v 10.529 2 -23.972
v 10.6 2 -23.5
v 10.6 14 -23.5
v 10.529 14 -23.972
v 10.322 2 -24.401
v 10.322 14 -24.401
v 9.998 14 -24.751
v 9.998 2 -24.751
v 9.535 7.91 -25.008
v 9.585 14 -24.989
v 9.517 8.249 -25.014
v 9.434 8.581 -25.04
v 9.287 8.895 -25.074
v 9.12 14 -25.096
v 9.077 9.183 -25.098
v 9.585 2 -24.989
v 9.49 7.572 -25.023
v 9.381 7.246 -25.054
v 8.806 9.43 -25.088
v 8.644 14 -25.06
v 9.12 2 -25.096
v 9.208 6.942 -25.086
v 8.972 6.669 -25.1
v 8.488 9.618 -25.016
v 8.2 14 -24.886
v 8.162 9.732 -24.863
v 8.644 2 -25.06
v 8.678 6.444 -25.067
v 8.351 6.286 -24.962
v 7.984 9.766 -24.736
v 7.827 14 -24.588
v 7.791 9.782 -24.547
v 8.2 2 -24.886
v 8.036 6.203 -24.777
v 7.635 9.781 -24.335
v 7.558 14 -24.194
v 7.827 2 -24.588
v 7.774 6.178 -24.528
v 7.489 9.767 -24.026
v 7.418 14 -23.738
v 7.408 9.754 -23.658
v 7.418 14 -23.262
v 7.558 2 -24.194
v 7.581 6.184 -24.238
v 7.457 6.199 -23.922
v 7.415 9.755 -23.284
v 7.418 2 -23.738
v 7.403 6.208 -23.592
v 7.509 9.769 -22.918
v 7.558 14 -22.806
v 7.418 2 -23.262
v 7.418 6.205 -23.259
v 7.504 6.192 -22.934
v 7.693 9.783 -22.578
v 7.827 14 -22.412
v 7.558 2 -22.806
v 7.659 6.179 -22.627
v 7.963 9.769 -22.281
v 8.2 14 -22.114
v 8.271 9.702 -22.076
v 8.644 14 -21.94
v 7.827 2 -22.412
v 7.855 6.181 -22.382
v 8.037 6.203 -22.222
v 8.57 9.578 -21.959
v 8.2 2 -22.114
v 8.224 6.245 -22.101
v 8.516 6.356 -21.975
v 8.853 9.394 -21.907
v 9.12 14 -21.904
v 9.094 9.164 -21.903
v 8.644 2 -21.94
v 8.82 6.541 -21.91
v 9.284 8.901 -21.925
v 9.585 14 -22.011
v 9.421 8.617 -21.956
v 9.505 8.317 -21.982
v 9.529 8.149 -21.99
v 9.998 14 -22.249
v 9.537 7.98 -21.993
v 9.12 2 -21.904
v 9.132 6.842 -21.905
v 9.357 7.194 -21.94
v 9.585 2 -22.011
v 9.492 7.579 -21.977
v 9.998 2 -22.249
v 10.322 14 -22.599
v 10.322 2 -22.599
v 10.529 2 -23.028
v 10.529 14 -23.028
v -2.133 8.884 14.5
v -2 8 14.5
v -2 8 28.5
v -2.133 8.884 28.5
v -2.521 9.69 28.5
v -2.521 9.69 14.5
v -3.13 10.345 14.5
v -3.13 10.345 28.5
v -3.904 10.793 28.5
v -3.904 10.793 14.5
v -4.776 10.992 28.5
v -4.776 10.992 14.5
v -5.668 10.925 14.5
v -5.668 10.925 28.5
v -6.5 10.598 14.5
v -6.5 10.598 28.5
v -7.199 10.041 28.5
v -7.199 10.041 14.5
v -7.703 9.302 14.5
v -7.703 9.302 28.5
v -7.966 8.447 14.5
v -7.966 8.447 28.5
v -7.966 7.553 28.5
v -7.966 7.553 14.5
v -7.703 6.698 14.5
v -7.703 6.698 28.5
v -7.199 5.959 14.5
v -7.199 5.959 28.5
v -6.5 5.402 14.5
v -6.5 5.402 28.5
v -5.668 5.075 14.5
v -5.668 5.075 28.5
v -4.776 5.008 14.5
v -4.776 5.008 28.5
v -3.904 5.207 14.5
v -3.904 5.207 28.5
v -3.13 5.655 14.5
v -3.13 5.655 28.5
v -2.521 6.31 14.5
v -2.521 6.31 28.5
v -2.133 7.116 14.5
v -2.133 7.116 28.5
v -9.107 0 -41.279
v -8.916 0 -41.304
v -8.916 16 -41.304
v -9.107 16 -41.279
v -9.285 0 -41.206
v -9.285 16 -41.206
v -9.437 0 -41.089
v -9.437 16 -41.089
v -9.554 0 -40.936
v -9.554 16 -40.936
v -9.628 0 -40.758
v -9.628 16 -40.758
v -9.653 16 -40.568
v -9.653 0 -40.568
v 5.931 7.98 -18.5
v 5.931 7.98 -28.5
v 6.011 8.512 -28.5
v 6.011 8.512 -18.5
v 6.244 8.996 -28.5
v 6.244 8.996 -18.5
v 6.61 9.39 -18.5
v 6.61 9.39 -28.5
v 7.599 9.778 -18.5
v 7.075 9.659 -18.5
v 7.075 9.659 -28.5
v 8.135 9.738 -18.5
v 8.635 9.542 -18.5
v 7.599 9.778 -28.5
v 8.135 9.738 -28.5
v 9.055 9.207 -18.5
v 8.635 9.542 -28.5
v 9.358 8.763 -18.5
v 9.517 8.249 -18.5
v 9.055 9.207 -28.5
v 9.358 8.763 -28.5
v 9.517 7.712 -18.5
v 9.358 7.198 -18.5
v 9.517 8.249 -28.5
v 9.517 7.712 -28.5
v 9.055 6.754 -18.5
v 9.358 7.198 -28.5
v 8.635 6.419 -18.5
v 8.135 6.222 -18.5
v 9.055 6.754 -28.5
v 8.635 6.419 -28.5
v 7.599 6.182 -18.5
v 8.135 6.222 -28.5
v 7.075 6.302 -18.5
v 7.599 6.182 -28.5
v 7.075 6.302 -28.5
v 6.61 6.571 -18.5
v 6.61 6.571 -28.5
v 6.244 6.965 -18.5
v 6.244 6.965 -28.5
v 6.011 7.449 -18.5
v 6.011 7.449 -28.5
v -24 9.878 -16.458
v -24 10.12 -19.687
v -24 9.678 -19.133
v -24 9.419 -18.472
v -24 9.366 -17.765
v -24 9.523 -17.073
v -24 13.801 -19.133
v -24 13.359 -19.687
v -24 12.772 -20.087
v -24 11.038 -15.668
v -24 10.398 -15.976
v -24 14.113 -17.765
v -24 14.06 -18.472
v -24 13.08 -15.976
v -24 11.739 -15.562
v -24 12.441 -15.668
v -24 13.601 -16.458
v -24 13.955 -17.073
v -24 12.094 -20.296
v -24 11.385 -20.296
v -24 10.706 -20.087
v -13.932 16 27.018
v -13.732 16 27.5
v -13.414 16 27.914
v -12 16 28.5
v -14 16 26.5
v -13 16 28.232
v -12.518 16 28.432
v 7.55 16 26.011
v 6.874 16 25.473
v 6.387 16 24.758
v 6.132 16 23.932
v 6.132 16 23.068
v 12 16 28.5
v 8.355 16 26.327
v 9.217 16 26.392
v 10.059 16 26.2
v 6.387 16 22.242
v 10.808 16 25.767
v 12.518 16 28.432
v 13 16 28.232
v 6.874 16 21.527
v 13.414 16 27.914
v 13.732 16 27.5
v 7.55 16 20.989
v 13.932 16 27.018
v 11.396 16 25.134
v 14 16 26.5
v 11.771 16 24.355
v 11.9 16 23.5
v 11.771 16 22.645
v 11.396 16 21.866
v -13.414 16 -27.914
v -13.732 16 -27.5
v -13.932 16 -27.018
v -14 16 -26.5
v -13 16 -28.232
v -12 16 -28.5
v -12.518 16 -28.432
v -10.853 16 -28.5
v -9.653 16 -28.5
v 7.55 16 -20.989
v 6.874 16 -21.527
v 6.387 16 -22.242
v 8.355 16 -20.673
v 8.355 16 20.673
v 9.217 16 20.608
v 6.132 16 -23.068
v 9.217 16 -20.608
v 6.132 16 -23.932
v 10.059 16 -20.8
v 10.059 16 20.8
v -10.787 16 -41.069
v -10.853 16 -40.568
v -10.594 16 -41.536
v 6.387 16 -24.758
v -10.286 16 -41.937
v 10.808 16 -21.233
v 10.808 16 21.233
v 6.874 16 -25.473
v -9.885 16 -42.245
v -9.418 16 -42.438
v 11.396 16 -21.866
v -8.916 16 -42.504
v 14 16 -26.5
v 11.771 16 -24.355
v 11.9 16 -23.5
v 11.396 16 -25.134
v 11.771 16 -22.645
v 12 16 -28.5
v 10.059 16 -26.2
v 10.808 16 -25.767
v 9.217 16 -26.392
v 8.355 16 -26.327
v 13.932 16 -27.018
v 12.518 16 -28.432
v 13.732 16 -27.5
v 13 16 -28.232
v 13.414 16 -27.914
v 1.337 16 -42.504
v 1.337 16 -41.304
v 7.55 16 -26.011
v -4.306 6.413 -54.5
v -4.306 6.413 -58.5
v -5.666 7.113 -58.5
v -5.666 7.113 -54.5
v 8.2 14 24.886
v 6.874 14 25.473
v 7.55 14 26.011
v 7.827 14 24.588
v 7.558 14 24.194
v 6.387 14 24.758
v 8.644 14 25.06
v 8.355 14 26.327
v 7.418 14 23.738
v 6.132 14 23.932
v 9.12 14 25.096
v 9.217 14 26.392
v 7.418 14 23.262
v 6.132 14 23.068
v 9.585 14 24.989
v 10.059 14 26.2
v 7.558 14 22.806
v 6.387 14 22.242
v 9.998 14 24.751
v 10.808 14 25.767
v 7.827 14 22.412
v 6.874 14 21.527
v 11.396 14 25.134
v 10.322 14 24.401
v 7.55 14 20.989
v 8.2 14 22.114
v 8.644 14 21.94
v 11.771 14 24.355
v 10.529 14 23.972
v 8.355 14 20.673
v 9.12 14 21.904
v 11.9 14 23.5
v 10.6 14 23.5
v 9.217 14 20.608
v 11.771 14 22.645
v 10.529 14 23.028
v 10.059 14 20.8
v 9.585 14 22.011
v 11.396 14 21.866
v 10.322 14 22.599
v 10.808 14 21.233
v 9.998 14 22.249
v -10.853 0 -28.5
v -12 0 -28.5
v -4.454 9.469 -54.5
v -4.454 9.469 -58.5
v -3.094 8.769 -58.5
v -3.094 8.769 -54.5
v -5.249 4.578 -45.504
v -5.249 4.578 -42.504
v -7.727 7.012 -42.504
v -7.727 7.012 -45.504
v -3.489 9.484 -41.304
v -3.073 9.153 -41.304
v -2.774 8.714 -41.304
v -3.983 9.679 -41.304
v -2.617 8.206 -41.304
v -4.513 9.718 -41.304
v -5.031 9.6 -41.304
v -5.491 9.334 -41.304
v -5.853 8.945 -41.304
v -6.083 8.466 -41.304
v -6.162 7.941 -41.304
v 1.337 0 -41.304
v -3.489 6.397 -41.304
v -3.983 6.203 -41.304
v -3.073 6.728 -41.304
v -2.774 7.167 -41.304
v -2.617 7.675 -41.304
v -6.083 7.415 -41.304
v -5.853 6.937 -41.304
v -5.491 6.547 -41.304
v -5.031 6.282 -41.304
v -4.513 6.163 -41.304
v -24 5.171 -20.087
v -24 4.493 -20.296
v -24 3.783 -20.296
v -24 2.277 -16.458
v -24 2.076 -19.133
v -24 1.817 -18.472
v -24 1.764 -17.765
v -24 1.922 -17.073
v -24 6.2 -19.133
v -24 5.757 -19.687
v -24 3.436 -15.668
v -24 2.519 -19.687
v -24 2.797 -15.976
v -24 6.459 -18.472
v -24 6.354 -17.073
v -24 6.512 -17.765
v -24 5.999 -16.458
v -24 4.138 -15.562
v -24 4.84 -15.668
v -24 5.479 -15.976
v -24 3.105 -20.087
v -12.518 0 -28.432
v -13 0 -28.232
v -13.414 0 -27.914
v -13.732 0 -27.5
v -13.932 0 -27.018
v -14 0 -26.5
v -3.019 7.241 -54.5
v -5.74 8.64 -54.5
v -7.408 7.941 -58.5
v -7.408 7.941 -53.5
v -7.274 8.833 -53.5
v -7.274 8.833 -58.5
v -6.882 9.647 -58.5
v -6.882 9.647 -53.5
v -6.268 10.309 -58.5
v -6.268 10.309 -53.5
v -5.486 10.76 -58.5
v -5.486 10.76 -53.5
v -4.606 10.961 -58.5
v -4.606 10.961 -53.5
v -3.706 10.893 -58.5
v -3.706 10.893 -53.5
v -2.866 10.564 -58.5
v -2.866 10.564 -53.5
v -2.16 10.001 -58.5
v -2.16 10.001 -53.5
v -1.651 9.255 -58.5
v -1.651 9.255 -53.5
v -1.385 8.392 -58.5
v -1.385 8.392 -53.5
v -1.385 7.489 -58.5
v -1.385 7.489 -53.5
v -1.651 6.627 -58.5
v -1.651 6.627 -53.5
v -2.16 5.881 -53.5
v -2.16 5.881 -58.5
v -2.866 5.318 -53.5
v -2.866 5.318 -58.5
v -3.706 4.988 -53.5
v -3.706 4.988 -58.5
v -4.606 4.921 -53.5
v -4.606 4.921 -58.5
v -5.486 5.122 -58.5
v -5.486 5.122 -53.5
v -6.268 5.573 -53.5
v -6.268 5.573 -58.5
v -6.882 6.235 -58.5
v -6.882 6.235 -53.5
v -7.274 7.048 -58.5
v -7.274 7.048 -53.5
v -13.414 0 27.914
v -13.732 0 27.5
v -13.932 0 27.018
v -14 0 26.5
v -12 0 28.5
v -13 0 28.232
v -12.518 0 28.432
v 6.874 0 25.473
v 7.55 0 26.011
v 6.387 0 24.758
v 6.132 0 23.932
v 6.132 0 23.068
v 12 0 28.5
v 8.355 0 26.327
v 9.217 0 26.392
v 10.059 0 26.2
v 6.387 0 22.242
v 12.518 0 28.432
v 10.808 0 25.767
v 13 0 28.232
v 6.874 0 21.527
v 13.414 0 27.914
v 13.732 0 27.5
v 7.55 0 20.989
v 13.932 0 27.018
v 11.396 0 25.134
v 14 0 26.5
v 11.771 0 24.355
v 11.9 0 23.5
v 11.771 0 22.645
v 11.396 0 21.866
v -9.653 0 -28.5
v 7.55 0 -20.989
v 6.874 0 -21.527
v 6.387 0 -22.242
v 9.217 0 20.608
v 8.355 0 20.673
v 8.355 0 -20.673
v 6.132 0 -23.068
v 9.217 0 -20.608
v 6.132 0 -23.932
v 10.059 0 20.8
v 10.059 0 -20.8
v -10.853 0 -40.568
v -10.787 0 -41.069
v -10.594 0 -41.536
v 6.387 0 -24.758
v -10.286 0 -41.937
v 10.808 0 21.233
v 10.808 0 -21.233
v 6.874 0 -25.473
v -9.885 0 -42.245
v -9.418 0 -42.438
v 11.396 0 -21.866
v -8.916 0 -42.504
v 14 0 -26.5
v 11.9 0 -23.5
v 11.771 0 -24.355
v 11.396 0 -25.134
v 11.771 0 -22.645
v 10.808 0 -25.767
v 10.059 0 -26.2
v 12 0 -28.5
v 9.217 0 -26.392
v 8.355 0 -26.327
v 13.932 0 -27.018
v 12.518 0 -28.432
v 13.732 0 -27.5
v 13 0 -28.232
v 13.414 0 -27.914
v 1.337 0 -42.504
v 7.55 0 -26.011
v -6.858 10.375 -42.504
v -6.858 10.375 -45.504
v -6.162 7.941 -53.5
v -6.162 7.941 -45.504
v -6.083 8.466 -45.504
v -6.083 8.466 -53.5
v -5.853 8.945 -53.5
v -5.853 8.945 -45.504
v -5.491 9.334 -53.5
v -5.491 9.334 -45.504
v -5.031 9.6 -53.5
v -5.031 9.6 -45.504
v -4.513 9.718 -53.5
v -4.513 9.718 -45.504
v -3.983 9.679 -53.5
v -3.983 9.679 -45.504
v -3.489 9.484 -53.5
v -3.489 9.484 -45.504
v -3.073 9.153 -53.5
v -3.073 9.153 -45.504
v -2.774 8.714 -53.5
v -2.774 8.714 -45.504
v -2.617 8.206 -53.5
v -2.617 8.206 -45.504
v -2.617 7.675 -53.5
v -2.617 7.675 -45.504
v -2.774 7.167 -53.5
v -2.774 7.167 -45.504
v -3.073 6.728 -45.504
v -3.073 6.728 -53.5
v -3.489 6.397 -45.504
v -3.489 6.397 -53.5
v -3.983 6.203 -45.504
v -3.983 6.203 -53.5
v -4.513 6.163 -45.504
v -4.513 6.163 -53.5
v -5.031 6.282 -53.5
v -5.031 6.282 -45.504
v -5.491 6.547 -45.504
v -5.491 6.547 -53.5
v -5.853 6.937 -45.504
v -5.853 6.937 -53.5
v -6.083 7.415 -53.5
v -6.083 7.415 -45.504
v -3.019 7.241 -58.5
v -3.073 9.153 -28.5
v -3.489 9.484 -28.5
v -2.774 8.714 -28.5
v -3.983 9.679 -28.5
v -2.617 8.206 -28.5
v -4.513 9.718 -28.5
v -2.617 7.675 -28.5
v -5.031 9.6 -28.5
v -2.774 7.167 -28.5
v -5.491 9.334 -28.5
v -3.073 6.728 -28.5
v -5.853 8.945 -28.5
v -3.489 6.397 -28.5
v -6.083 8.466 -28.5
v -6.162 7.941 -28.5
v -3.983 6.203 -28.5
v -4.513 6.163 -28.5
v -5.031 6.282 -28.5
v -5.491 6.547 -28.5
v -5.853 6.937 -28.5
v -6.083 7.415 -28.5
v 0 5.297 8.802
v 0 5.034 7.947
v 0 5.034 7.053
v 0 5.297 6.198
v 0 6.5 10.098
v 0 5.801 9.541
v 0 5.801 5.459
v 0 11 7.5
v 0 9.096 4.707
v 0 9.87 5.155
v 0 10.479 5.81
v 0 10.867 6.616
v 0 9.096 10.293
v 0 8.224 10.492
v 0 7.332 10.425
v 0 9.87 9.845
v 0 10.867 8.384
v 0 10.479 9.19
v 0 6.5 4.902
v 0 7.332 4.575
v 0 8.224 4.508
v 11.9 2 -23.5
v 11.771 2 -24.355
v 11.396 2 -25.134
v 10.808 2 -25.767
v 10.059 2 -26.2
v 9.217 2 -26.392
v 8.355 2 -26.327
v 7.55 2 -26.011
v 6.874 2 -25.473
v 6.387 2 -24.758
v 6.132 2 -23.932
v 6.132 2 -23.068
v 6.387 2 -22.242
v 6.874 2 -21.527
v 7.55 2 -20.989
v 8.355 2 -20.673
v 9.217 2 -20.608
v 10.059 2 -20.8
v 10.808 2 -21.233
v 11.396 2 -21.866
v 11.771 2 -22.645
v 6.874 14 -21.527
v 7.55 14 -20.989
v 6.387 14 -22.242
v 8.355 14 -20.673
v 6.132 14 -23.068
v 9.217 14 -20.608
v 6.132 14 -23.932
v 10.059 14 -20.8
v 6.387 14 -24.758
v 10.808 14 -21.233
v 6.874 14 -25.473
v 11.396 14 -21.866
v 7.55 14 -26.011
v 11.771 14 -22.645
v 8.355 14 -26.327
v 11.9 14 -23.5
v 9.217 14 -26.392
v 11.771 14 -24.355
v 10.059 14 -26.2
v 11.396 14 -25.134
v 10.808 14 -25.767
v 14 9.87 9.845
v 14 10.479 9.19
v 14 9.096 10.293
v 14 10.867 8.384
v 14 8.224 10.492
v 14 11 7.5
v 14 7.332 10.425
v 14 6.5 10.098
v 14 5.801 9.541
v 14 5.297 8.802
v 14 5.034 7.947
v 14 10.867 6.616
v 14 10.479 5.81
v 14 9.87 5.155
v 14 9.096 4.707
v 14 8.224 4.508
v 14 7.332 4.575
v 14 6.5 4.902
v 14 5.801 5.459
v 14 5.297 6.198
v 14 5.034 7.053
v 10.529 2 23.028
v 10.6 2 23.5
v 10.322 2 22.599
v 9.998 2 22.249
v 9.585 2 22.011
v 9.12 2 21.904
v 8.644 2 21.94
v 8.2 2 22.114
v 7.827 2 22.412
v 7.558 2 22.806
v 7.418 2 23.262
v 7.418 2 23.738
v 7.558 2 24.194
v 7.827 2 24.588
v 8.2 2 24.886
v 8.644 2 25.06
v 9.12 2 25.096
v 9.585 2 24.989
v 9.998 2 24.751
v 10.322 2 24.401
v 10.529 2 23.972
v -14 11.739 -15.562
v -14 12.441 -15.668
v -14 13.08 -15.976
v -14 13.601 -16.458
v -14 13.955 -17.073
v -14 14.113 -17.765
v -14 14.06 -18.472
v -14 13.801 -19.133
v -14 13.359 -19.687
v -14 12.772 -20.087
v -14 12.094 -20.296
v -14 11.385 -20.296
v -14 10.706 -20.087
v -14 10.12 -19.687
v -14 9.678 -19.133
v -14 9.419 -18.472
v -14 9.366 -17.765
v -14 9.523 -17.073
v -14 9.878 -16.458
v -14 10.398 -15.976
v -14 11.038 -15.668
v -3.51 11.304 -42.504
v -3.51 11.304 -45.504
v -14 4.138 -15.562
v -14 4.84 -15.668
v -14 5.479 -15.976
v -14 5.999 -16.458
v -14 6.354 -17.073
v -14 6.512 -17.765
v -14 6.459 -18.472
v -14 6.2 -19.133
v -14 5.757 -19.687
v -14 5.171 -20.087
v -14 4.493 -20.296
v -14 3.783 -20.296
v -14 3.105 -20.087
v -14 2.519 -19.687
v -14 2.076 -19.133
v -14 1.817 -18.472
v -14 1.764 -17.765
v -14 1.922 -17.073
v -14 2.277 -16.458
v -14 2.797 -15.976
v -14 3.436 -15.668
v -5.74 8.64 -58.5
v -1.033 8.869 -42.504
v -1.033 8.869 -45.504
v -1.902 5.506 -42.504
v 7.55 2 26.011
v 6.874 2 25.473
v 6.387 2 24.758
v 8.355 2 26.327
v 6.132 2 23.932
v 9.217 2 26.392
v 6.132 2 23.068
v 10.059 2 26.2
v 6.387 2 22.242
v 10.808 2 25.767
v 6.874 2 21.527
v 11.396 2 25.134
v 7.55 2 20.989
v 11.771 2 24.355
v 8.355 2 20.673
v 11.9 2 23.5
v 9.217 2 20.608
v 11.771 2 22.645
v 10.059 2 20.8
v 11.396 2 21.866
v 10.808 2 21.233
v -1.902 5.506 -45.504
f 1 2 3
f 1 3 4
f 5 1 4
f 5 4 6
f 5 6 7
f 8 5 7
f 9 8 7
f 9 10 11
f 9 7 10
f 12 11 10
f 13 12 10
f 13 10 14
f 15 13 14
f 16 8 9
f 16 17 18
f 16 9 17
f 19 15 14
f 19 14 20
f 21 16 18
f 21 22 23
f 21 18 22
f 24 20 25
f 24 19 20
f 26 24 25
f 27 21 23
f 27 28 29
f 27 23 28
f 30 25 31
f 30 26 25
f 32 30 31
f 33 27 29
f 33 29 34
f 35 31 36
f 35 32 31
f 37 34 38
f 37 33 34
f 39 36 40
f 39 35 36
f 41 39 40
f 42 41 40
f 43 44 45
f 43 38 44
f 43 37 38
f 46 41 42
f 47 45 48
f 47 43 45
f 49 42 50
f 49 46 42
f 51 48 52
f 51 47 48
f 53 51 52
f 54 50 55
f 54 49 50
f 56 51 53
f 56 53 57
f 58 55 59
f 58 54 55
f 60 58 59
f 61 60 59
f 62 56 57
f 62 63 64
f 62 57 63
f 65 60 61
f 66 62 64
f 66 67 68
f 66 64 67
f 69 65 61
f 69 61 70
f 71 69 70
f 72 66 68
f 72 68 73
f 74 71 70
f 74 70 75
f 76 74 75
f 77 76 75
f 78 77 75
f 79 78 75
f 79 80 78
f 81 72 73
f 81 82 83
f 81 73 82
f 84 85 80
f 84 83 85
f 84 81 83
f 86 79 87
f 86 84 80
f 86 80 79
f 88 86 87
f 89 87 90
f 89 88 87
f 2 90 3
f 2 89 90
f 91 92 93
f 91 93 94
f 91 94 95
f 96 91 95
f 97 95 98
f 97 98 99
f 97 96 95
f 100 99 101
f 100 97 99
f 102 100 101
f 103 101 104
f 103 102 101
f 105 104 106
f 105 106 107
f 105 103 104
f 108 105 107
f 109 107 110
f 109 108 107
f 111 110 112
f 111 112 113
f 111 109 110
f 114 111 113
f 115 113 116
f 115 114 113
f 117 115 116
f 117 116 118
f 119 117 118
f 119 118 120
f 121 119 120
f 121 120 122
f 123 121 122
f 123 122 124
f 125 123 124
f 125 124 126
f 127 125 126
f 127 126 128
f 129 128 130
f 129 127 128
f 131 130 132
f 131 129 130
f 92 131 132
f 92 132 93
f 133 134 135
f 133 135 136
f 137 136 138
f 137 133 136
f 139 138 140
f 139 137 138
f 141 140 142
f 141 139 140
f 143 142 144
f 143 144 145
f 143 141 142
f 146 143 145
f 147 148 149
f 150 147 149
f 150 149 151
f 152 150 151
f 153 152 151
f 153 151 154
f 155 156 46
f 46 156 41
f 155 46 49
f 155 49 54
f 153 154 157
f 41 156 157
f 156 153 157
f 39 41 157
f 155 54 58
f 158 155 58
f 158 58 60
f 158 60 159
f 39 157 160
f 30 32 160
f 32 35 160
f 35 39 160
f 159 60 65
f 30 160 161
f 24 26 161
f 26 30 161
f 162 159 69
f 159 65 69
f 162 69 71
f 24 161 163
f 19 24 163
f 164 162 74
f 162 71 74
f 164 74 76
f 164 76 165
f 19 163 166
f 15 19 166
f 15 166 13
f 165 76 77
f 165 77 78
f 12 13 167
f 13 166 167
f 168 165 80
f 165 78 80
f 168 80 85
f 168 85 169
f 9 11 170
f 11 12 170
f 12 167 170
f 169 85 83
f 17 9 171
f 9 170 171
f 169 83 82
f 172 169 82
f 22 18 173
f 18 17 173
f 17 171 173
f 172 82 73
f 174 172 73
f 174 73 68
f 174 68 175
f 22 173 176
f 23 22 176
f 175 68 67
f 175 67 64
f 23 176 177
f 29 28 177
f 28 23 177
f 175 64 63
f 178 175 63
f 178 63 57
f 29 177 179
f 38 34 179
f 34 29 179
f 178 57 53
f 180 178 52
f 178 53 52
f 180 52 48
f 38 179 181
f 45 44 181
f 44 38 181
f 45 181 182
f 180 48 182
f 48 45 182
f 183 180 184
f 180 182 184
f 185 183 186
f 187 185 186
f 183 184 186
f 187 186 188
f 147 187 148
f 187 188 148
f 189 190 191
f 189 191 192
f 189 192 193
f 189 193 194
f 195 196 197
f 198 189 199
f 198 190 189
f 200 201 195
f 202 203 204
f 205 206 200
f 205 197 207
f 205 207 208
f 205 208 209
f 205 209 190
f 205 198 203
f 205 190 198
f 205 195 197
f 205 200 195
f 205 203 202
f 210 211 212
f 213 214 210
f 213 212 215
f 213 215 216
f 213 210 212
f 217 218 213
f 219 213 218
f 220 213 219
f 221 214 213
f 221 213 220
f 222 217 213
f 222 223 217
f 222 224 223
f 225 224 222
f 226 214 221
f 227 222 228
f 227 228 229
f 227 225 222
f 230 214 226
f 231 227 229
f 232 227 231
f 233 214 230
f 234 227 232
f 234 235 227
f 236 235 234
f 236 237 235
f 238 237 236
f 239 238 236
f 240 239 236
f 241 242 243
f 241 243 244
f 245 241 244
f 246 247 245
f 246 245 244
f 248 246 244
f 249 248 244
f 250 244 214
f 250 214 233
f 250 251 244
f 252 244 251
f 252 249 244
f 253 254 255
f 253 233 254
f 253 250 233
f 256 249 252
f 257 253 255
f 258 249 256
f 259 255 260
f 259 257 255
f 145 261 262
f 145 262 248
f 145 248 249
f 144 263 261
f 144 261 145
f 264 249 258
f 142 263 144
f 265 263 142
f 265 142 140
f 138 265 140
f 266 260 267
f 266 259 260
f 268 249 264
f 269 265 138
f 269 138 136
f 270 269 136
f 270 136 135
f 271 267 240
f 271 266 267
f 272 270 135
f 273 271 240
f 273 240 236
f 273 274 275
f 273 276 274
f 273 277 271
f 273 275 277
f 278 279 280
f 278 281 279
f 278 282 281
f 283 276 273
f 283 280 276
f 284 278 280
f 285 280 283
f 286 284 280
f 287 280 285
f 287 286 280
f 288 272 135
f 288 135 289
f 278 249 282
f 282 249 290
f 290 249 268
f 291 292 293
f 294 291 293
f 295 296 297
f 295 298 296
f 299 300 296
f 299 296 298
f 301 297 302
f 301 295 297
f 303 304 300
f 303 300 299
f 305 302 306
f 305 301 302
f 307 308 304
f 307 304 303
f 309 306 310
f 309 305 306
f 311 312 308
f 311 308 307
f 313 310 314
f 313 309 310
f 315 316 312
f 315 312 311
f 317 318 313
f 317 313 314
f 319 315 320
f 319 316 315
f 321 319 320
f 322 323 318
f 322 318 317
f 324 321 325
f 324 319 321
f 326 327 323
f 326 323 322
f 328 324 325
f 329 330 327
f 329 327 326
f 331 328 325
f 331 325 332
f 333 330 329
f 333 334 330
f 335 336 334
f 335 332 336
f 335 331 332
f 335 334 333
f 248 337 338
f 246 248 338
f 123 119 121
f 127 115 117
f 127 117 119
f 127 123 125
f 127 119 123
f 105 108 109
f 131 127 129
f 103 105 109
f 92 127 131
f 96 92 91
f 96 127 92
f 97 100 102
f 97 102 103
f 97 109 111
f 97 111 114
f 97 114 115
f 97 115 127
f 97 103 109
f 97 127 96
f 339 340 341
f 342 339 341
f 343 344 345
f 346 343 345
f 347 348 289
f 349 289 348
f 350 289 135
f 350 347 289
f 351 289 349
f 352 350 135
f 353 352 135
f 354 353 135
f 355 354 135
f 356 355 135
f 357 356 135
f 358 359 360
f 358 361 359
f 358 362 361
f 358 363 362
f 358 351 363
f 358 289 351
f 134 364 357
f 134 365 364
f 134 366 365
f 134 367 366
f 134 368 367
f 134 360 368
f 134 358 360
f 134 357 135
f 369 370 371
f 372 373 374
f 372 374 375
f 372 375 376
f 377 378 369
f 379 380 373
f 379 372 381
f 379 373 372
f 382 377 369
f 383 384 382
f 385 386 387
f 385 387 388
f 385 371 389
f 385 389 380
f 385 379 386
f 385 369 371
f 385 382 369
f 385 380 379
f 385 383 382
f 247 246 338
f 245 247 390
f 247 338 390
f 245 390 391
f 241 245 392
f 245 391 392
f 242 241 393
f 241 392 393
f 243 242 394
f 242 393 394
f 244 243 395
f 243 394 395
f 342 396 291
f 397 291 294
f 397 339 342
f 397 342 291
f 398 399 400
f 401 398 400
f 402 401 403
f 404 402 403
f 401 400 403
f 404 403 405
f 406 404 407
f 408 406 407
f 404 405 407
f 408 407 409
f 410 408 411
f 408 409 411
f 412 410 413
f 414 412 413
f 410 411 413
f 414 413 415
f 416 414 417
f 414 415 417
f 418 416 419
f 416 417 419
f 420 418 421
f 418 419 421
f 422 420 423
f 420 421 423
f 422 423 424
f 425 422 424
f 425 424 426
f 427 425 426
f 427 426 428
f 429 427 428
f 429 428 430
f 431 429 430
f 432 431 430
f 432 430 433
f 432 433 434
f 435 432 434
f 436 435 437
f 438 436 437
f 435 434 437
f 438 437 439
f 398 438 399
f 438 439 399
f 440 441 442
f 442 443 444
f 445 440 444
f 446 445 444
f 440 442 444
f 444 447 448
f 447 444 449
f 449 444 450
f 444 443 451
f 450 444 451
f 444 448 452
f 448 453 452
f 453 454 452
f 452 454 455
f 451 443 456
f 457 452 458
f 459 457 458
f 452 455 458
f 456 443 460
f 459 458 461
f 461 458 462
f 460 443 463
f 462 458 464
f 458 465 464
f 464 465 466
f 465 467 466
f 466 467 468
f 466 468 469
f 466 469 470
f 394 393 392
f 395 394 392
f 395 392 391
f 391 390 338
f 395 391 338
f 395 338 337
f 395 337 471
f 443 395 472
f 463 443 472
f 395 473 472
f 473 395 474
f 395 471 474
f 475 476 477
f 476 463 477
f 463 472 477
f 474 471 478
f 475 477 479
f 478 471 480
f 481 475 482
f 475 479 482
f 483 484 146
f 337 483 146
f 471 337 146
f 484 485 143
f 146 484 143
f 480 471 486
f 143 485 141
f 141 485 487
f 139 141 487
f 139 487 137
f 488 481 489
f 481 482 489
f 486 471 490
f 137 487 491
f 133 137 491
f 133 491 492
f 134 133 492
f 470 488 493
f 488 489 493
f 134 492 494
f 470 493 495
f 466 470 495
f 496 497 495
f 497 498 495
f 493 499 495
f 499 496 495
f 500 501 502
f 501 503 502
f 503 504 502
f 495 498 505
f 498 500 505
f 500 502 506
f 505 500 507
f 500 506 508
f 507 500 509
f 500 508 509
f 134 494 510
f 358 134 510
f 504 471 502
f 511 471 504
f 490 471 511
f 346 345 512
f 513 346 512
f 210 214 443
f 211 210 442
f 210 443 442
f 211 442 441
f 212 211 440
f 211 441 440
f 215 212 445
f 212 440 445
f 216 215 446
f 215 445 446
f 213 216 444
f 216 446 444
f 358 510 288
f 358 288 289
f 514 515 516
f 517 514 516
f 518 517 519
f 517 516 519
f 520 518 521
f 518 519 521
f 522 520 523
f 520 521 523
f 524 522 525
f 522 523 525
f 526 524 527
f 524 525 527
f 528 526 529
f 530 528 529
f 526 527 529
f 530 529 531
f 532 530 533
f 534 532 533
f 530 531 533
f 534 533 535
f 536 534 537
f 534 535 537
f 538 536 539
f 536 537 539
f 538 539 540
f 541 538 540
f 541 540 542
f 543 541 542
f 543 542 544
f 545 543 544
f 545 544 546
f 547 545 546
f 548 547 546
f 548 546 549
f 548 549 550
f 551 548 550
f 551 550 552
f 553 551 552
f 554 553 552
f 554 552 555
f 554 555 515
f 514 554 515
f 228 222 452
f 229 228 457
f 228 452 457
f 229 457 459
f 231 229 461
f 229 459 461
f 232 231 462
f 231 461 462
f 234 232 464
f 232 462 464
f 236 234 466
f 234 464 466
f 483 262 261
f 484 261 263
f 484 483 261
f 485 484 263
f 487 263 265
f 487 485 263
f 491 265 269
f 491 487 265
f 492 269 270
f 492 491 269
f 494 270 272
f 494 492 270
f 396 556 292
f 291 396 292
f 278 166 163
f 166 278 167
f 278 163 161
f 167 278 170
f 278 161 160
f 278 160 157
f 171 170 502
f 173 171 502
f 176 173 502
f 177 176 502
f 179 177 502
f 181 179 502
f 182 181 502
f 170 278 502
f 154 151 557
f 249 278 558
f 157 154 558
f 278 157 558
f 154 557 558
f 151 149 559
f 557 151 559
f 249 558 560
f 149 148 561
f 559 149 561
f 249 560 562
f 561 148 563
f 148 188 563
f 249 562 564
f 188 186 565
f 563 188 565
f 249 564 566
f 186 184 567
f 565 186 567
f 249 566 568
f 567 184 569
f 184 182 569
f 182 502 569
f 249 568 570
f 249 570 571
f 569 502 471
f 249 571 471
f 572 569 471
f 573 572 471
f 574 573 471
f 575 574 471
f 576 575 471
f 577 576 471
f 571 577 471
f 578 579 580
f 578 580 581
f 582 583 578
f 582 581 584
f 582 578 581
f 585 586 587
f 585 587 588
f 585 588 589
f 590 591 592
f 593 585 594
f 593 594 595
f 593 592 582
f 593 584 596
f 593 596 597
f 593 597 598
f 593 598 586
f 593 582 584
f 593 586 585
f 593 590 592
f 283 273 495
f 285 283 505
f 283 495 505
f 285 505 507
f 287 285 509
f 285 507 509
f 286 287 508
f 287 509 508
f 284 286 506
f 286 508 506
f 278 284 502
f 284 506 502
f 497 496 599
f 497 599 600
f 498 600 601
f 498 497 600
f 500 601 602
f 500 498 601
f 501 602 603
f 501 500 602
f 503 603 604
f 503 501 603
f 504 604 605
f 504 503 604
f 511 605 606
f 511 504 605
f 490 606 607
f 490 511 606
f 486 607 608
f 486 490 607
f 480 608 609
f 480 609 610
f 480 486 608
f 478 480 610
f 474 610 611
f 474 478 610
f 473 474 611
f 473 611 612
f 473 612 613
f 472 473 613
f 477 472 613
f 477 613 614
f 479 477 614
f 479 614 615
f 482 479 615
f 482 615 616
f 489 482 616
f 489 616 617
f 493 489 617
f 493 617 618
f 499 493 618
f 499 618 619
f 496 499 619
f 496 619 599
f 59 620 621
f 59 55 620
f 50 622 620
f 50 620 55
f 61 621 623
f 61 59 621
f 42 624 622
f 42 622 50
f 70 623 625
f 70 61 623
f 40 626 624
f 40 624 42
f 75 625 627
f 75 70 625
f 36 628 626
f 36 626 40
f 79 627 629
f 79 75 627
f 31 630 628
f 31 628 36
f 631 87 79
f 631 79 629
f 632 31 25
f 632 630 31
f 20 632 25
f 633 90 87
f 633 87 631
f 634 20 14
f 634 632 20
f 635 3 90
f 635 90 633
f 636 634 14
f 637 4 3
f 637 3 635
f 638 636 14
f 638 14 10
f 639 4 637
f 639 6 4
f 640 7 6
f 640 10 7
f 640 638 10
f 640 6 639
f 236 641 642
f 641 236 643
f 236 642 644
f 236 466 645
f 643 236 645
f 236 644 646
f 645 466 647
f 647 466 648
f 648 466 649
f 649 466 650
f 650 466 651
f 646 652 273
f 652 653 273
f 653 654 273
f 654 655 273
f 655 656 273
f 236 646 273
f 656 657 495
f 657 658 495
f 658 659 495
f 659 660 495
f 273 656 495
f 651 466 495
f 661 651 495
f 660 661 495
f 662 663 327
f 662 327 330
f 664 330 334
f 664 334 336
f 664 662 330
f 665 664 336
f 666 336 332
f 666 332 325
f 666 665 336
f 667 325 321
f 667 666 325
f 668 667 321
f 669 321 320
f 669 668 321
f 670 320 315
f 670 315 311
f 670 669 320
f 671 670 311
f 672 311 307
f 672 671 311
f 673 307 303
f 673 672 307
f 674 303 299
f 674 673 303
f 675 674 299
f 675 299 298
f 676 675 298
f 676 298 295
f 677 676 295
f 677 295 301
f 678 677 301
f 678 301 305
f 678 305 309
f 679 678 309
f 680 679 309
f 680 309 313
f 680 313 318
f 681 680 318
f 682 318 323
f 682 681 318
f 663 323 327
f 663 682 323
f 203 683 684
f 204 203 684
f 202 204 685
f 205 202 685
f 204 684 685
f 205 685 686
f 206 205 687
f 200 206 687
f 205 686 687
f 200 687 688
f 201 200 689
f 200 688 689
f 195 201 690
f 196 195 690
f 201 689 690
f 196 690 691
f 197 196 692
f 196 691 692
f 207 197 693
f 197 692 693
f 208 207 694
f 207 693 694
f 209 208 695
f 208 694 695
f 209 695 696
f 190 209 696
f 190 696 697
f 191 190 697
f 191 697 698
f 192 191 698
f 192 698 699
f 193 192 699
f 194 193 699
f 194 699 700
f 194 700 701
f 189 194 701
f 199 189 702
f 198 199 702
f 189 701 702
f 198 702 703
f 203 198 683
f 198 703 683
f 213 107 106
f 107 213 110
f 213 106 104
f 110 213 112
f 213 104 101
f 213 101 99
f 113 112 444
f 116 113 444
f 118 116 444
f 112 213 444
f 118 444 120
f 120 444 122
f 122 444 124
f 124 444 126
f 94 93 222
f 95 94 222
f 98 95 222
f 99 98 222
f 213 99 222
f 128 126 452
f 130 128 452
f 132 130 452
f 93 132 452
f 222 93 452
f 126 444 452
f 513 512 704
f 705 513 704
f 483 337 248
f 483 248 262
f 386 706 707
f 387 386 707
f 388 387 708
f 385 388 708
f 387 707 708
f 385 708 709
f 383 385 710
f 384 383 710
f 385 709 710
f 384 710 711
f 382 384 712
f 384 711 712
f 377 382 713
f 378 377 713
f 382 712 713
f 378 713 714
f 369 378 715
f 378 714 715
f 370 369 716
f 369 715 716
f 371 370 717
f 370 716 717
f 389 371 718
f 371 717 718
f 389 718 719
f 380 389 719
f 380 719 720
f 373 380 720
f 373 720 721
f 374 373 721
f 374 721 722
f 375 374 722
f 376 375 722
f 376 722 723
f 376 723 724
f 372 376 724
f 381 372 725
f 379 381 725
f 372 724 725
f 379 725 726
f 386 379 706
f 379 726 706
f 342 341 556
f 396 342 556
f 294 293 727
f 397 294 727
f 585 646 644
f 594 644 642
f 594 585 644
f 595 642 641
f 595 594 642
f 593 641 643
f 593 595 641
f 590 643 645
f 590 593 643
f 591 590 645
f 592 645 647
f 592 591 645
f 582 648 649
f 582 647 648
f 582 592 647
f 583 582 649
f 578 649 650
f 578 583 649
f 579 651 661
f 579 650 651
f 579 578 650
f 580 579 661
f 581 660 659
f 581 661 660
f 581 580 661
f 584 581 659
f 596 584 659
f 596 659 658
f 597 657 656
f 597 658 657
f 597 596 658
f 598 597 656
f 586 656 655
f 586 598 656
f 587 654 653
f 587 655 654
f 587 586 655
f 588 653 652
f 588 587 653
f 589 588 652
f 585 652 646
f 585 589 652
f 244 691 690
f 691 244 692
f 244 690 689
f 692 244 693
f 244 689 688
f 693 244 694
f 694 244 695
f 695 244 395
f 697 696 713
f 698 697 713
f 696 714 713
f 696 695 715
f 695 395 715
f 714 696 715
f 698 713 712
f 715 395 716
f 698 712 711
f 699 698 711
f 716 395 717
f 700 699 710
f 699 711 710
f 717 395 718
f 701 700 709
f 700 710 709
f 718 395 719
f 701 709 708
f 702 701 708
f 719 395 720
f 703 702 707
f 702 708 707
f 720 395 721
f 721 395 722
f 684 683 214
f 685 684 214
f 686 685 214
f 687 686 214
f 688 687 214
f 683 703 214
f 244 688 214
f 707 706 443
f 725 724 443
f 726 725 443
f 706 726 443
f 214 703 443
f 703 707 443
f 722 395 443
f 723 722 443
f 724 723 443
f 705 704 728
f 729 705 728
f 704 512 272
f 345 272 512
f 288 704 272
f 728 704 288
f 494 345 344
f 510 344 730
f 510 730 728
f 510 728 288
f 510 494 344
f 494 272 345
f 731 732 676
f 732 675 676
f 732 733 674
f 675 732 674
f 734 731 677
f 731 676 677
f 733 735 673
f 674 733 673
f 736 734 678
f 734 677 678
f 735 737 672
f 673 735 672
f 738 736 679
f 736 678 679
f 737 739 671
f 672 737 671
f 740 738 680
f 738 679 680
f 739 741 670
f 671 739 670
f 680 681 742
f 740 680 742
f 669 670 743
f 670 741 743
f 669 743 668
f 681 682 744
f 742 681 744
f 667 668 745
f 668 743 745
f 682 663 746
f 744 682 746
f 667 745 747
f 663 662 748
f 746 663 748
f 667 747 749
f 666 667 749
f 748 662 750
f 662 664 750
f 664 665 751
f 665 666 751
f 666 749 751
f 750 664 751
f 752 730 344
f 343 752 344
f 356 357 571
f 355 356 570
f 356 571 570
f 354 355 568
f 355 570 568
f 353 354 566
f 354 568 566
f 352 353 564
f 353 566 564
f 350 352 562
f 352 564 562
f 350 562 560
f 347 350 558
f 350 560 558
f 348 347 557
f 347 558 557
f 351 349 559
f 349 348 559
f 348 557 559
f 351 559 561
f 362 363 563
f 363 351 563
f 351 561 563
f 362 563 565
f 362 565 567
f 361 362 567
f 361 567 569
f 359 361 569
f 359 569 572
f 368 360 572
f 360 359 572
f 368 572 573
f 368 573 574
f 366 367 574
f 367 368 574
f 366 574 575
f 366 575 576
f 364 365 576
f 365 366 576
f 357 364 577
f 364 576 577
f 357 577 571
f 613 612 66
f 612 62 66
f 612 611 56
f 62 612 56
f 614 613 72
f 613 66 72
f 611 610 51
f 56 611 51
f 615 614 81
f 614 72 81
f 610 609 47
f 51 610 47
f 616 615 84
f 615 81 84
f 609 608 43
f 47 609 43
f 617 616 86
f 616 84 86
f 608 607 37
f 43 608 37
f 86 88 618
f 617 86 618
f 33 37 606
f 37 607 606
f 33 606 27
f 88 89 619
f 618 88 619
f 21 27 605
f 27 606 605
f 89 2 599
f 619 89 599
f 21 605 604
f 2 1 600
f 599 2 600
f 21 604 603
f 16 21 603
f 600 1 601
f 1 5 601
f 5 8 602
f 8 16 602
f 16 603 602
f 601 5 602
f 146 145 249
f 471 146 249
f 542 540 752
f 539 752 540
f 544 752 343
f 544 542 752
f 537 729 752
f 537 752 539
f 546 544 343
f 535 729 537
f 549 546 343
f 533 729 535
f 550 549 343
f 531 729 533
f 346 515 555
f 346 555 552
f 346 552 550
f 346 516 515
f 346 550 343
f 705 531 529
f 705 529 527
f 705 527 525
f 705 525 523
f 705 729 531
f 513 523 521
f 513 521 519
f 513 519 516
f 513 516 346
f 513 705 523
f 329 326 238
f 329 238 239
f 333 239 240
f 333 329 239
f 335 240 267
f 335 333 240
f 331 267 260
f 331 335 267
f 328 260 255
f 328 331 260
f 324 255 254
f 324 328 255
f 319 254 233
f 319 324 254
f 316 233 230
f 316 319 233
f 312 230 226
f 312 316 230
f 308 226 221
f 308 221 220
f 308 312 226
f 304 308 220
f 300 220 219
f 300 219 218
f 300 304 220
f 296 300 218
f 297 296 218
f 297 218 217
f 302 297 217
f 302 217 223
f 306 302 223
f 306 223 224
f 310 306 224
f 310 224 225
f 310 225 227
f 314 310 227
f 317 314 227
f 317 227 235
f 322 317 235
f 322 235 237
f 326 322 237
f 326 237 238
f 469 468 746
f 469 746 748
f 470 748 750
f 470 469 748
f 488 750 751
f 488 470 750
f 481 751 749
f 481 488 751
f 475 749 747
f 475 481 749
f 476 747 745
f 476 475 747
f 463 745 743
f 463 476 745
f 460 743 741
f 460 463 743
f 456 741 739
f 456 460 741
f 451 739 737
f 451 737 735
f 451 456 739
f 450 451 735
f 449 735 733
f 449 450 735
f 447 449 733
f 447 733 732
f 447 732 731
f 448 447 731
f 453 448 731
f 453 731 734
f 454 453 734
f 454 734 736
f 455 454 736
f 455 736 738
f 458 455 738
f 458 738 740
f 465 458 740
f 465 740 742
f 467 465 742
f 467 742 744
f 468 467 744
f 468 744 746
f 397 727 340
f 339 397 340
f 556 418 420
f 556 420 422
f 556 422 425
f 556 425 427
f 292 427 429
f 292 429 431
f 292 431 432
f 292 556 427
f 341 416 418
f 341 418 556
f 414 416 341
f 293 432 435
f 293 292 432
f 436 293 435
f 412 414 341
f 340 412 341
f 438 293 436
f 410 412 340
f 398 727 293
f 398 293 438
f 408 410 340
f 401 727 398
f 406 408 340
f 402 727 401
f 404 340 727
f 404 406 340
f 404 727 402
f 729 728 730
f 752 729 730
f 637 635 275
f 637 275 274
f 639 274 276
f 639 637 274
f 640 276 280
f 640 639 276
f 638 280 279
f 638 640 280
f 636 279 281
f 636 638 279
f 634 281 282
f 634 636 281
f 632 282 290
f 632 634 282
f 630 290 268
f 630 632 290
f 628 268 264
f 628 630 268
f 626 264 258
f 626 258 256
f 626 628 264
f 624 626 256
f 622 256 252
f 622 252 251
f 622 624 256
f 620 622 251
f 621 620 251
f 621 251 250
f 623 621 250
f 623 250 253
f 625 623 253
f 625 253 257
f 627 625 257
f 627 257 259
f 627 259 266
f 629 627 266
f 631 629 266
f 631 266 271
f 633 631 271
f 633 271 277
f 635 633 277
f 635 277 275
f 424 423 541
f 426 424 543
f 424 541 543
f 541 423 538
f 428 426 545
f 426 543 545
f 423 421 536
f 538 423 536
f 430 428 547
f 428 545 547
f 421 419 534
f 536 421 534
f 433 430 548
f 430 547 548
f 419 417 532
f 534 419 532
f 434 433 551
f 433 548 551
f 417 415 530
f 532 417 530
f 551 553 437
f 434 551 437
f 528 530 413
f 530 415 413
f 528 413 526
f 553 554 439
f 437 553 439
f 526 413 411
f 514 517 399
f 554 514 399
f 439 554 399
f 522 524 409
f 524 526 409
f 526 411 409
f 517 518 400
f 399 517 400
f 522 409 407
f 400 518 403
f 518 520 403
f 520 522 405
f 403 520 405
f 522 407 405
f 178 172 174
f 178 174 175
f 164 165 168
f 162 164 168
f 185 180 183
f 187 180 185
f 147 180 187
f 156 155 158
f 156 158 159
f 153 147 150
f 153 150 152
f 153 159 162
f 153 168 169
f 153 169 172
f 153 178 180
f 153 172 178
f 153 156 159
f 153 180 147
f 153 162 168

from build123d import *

# Parameters (mm, degrees)
CUT_EXTRUDE_START           = 11
CUT_EXTRUDE_1_OUTLINE_R     = 2.9
CUT_EXTRUDE_1_DEPTH         = 5
CUT_EXTRUDE_1_2_OUTLINE_R   = 2.9
CUT_EXTRUDE_1_2_DEPTH       = 4.9999999
CUT_EXTRUDE_START_2         = 2
CUT_EXTRUDE_1_3_OUTLINE_R   = 2.9
CUT_EXTRUDE_1_3_OUTLINE_R_2 = 1.6
CUT_EXTRUDE_1_3_DEPTH       = 12
CUT_EXTRUDE_START_3         = 4.9999999
CUT_EXTRUDE_1_4_OUTLINE_R   = 2.9
CUT_EXTRUDE_1_4_DEPTH       = 6.0000001
CUT_EXTRUDE_START_4         = 15.5
CUT_EXTRUDE_1_5_OUTLINE_R   = 5.75
CUT_EXTRUDE_1_5_OUTLINE_R_2 = 3
CUT_EXTRUDE_1_5_DEPTH       = 1.5
CUT_EXTRUDE_START_5         = 14
CUT_EXTRUDE_1_6_OUTLINE_R   = 4
CUT_EXTRUDE_1_6_OUTLINE_R_2 = 3
CUT_EXTRUDE_1_6_DEPTH       = 1.5
CUT_EXTRUDE_1_7_OUTLINE_R   = 3
CUT_EXTRUDE_1_7_DEPTH       = 14
CUT_EXTRUDE_START_6         = 14.5
CUT_EXTRUDE_1_8_OUTLINE_R   = 3
CUT_EXTRUDE_1_8_DEPTH       = 14
SKETCH_2_R                  = 6.172348418
CUT_EXTRUDE_2_DEPTH         = 3
SKETCH_3_R                  = 1.803021439
CUT_EXTRUDE_3_DEPTH         = 10
SM_BASE_FLANGE_1_DEPTH      = 16
SKETCH_7_R                  = 1.782386215
EXTRUDE_1_DEPTH             = 25
SKETCH_8_R                  = 3.028561668
EXTRUDE_2_DEPTH             = 5
CUT_EXTRUDE_4_DEPTH         = 4
EXTRUDE_3_DEPTH             = 3
SKETCH_11_R                 = 2.38049646
EXTRUDE_4_DEPTH             = 10


with BuildPart() as part:
    # 切除-拉伸1: read off the stored shape, not the designer's step
    # 切除-拉伸1 outline → 切除-拉伸1 (new body)
    with BuildSketch(Plane(origin=(0, 0, 0), x_dir=(1, 0, 0), z_dir=(0, 1, 0)).offset(CUT_EXTRUDE_START)):
        with BuildLine():
            ThreePointArc((-12, 28.5), (-13.414213562, 27.914213562), (-14, 26.5))
            Line((-14, 26.5), (-14, -26.5))
            ThreePointArc((-14, -26.5), (-13.414213562, -27.914213562), (-12, -28.5))
            Line((-12, -28.5), (12, -28.5))
            ThreePointArc((12, -28.5), (13.414213562, -27.914213562), (14, -26.5))
            Line((14, -26.5), (14, 26.5))
            ThreePointArc((14, 26.5), (13.414213562, 27.914213562), (12, 28.5))
            Line((12, 28.5), (-12, 28.5))
        make_face()
        with Locations((9, -23.5)):
            Circle(CUT_EXTRUDE_1_OUTLINE_R, mode=Mode.SUBTRACT)
        with Locations((9, 23.5)):
            Circle(CUT_EXTRUDE_1_OUTLINE_R, mode=Mode.SUBTRACT)
    extrude(amount=CUT_EXTRUDE_1_DEPTH)



with BuildPart() as body_2:
    # Cut-Extrude 1 2 outline → Cut-Extrude 1 2 (new body)
    with BuildSketch(Plane(origin=(0, 0, 0), x_dir=(1, 0, 0), z_dir=(0, 1, 0))):
        with BuildLine():
            ThreePointArc((-12, 28.5), (-13.414213562, 27.914213562), (-14, 26.5))
            Line((-14, 26.5), (-14, -26.5))
            ThreePointArc((-14, -26.5), (-13.414213562, -27.914213562), (-12, -28.5))
            Line((-12, -28.5), (12, -28.5))
            ThreePointArc((12, -28.5), (13.414213562, -27.914213562), (14, -26.5))
            Line((14, -26.5), (14, 26.5))
            ThreePointArc((14, 26.5), (13.414213562, 27.914213562), (12, 28.5))
            Line((12, 28.5), (-12, 28.5))
        make_face()
        with Locations((9, -23.5)):
            Circle(CUT_EXTRUDE_1_2_OUTLINE_R, mode=Mode.SUBTRACT)
        with Locations((9, 23.5)):
            Circle(CUT_EXTRUDE_1_2_OUTLINE_R, mode=Mode.SUBTRACT)
    extrude(amount=CUT_EXTRUDE_1_2_DEPTH)


with BuildPart() as part_1:
    add(part.part)

    add(body_2.part)  # Cut-Extrude 1 3 merges body 2
    # Cut-Extrude 1 3 outline → Cut-Extrude 1 3 (add)
    # profile 1 of 2: a face of its own
    with BuildSketch(Plane(origin=(0, 0, 0), x_dir=(1, 0, 0), z_dir=(0, 1, 0)).offset(CUT_EXTRUDE_START_2)):
        with Locations((9, 23.5)):
            Circle(CUT_EXTRUDE_1_3_OUTLINE_R)
        with Locations((9, 23.5)):
            Circle(CUT_EXTRUDE_1_3_OUTLINE_R_2, mode=Mode.SUBTRACT)
    # profile 2 of 2: a face of its own
    with BuildSketch(Plane(origin=(0, 0, 0), x_dir=(1, 0, 0), z_dir=(0, 1, 0)).offset(CUT_EXTRUDE_START_2)):
        with Locations((9, -23.5)):
            Circle(CUT_EXTRUDE_1_3_OUTLINE_R)
        with Locations((9, -23.5)):
            Circle(CUT_EXTRUDE_1_3_OUTLINE_R_2, mode=Mode.SUBTRACT)
    extrude(amount=CUT_EXTRUDE_1_3_DEPTH)

    # Cut-Extrude 1 4 outline → Cut-Extrude 1 4 (add)
    with BuildSketch(Plane(origin=(0, 0, 0), x_dir=(1, 0, 0), z_dir=(0, 1, 0)).offset(CUT_EXTRUDE_START_3)):
        with BuildLine():
            ThreePointArc((-12, 28.5), (-13.414213562, 27.914213562), (-14, 26.5))
            Line((-14, 26.5), (-14, -26.5))
            ThreePointArc((-14, -26.5), (-13.414213562, -27.914213562), (-12, -28.5))
            Line((-12, -28.5), (12, -28.5))
            ThreePointArc((12, -28.5), (13.414213562, -27.914213562), (14, -26.5))
            Line((14, -26.5), (14, 26.5))
            ThreePointArc((14, 26.5), (13.414213562, 27.914213562), (12, 28.5))
            Line((12, 28.5), (-12, 28.5))
        make_face()
        with Locations((9, -23.5)):
            Circle(CUT_EXTRUDE_1_4_OUTLINE_R, mode=Mode.SUBTRACT)
        with Locations((9, 23.5)):
            Circle(CUT_EXTRUDE_1_4_OUTLINE_R, mode=Mode.SUBTRACT)
    extrude(amount=CUT_EXTRUDE_1_4_DEPTH)



with BuildPart() as body_2_2:
    # Cut-Extrude 1 5 outline → Cut-Extrude 1 5 (new body)
    with BuildSketch(Plane.YZ.offset(CUT_EXTRUDE_START_4)):
        with Locations((8, 7.5)):
            Circle(CUT_EXTRUDE_1_5_OUTLINE_R)
        with Locations((8, 7.5)):
            Circle(CUT_EXTRUDE_1_5_OUTLINE_R_2, mode=Mode.SUBTRACT)
    extrude(amount=CUT_EXTRUDE_1_5_DEPTH)


with BuildPart() as part_2:
    add(part_1.part)

    add(body_2_2.part)  # Cut-Extrude 1 6 merges body 2 2
    # Cut-Extrude 1 6 outline → Cut-Extrude 1 6 (add)
    with BuildSketch(Plane.YZ.offset(CUT_EXTRUDE_START_5)):
        with Locations((8, 7.5)):
            Circle(CUT_EXTRUDE_1_6_OUTLINE_R)
        with Locations((8, 7.5)):
            Circle(CUT_EXTRUDE_1_6_OUTLINE_R_2, mode=Mode.SUBTRACT)
    extrude(amount=CUT_EXTRUDE_1_6_DEPTH)

    # Cut-Extrude 1 7 outline → Cut-Extrude 1 7 (cut)
    with BuildSketch(Plane.YZ):
        with Locations((8, 7.5)):
            Circle(CUT_EXTRUDE_1_7_OUTLINE_R)
    extrude(amount=CUT_EXTRUDE_1_7_DEPTH, mode=Mode.SUBTRACT)

    # Cut-Extrude 1 8 outline → Cut-Extrude 1 8 (cut)
    with BuildSketch(Plane.XY.offset(CUT_EXTRUDE_START_6)):
        with Locations((-5, 8)):
            Circle(CUT_EXTRUDE_1_8_OUTLINE_R)
    extrude(amount=CUT_EXTRUDE_1_8_DEPTH, mode=Mode.SUBTRACT)

    # 草图2 → 切除-拉伸2 (cut)
    with BuildSketch(Plane(origin=(17, 0, 0), x_dir=(0, 0, -1), z_dir=(1, 0, 0))):
        with Locations((-7.5, 8)):
            Circle(SKETCH_2_R)
    extrude(amount=-CUT_EXTRUDE_2_DEPTH, mode=Mode.SUBTRACT)

    # 草图3 → 切除-拉伸3 (cut)
    with BuildSketch(Plane(origin=(0, 0, -28.5), x_dir=(-1, 0, 0), z_dir=(0, 0, -1))):
        with Locations((-7.733778242, 7.980270974)):
            Circle(SKETCH_3_R)
    extrude(amount=-CUT_EXTRUDE_3_DEPTH, mode=Mode.SUBTRACT)



with BuildPart() as body_2_3:
    # 基体-法兰1: sheet metal written as solids
    # 草图4 → 基体-法兰1 (new body)
    with BuildSketch(Plane(origin=(0, 0, 0), x_dir=(1, 0, 0), z_dir=(0, 1, 0))):
        with BuildLine():
            Line((-10.853055632, 28.5), (-10.853055632, 40.567762067))
            ThreePointArc((-10.853055632, 40.567762067), (-10.285838624, 41.937145059), (-8.916455632, 42.504362067))
            Line((-8.916455632, 42.504362067), (1.33725023, 42.504362067))
            Line((1.33725023, 42.504362067), (1.33725023, 41.304362067))
            Line((1.33725023, 41.304362067), (-8.916455632, 41.304362067))
            ThreePointArc((-8.916455632, 41.304362067), (-9.437310487, 41.088616922), (-9.653055632, 40.567762067))
            Line((-9.653055632, 40.567762067), (-9.653055632, 28.5))
            Line((-9.653055632, 28.5), (-10.853055632, 28.5))
        make_face()
    extrude(amount=SM_BASE_FLANGE_1_DEPTH)


with BuildPart() as part_3:
    add(part_2.part)

    add(body_2_3.part)  # 凸台-拉伸1 merges body 2 3
    # 草图7 → 凸台-拉伸1 (add)
    with BuildSketch(Plane(origin=(0, 0, -28.5), x_dir=(-1, 0, 0), z_dir=(0, 0, -1))):
        with Locations((4.3798438, 7.940812922)):
            Circle(SKETCH_7_R)
    extrude(amount=EXTRUDE_1_DEPTH)

    # 草图8 → 凸台-拉伸2 (add)
    with BuildSketch(Plane(origin=(0, 0, -53.5), x_dir=(-1, 0, 0), z_dir=(0, 0, -1))):
        with Locations((4.3798438, 7.940812922)):
            Circle(SKETCH_8_R)
    extrude(amount=EXTRUDE_2_DEPTH)

    # 草图9 → 切除-拉伸4 (cut)
    with BuildSketch(Plane(origin=(0, 0, -58.5), x_dir=(-1, 0, 0), z_dir=(0, 0, -1))):
        Polygon((3.093792683, 8.769117031), (3.01948584, 7.241212038), (4.305536958, 6.412907929), (5.665894918, 7.112508812), (5.74020176, 8.640413805), (4.454150642, 9.468717915), align=None)
    extrude(amount=-CUT_EXTRUDE_4_DEPTH, mode=Mode.SUBTRACT)

    # 草图10 → 凸台-拉伸3 (add)
    with BuildSketch(Plane(origin=(0, 0, -42.504362067), x_dir=(-1, 0, 0), z_dir=(0, 0, -1))):
        Polygon((7.727133917, 7.012317312), (6.857589643, 10.375403392), (3.510299527, 11.303899001), (1.032553683, 8.869308531), (1.902097957, 5.506222451), (5.249388073, 4.577726842), align=None)
    extrude(amount=EXTRUDE_3_DEPTH)

    # 草图11 → 凸台-拉伸4 (add)
    with BuildSketch(Plane.ZY.offset(14)):
        with Locations((-17.942443325, 11.739355059)):
            Circle(SKETCH_11_R)
        with Locations((-17.942443325, 4.138043136)):
            Circle(SKETCH_11_R)
    extrude(amount=EXTRUDE_4_DEPTH)


solid = part_3.part
